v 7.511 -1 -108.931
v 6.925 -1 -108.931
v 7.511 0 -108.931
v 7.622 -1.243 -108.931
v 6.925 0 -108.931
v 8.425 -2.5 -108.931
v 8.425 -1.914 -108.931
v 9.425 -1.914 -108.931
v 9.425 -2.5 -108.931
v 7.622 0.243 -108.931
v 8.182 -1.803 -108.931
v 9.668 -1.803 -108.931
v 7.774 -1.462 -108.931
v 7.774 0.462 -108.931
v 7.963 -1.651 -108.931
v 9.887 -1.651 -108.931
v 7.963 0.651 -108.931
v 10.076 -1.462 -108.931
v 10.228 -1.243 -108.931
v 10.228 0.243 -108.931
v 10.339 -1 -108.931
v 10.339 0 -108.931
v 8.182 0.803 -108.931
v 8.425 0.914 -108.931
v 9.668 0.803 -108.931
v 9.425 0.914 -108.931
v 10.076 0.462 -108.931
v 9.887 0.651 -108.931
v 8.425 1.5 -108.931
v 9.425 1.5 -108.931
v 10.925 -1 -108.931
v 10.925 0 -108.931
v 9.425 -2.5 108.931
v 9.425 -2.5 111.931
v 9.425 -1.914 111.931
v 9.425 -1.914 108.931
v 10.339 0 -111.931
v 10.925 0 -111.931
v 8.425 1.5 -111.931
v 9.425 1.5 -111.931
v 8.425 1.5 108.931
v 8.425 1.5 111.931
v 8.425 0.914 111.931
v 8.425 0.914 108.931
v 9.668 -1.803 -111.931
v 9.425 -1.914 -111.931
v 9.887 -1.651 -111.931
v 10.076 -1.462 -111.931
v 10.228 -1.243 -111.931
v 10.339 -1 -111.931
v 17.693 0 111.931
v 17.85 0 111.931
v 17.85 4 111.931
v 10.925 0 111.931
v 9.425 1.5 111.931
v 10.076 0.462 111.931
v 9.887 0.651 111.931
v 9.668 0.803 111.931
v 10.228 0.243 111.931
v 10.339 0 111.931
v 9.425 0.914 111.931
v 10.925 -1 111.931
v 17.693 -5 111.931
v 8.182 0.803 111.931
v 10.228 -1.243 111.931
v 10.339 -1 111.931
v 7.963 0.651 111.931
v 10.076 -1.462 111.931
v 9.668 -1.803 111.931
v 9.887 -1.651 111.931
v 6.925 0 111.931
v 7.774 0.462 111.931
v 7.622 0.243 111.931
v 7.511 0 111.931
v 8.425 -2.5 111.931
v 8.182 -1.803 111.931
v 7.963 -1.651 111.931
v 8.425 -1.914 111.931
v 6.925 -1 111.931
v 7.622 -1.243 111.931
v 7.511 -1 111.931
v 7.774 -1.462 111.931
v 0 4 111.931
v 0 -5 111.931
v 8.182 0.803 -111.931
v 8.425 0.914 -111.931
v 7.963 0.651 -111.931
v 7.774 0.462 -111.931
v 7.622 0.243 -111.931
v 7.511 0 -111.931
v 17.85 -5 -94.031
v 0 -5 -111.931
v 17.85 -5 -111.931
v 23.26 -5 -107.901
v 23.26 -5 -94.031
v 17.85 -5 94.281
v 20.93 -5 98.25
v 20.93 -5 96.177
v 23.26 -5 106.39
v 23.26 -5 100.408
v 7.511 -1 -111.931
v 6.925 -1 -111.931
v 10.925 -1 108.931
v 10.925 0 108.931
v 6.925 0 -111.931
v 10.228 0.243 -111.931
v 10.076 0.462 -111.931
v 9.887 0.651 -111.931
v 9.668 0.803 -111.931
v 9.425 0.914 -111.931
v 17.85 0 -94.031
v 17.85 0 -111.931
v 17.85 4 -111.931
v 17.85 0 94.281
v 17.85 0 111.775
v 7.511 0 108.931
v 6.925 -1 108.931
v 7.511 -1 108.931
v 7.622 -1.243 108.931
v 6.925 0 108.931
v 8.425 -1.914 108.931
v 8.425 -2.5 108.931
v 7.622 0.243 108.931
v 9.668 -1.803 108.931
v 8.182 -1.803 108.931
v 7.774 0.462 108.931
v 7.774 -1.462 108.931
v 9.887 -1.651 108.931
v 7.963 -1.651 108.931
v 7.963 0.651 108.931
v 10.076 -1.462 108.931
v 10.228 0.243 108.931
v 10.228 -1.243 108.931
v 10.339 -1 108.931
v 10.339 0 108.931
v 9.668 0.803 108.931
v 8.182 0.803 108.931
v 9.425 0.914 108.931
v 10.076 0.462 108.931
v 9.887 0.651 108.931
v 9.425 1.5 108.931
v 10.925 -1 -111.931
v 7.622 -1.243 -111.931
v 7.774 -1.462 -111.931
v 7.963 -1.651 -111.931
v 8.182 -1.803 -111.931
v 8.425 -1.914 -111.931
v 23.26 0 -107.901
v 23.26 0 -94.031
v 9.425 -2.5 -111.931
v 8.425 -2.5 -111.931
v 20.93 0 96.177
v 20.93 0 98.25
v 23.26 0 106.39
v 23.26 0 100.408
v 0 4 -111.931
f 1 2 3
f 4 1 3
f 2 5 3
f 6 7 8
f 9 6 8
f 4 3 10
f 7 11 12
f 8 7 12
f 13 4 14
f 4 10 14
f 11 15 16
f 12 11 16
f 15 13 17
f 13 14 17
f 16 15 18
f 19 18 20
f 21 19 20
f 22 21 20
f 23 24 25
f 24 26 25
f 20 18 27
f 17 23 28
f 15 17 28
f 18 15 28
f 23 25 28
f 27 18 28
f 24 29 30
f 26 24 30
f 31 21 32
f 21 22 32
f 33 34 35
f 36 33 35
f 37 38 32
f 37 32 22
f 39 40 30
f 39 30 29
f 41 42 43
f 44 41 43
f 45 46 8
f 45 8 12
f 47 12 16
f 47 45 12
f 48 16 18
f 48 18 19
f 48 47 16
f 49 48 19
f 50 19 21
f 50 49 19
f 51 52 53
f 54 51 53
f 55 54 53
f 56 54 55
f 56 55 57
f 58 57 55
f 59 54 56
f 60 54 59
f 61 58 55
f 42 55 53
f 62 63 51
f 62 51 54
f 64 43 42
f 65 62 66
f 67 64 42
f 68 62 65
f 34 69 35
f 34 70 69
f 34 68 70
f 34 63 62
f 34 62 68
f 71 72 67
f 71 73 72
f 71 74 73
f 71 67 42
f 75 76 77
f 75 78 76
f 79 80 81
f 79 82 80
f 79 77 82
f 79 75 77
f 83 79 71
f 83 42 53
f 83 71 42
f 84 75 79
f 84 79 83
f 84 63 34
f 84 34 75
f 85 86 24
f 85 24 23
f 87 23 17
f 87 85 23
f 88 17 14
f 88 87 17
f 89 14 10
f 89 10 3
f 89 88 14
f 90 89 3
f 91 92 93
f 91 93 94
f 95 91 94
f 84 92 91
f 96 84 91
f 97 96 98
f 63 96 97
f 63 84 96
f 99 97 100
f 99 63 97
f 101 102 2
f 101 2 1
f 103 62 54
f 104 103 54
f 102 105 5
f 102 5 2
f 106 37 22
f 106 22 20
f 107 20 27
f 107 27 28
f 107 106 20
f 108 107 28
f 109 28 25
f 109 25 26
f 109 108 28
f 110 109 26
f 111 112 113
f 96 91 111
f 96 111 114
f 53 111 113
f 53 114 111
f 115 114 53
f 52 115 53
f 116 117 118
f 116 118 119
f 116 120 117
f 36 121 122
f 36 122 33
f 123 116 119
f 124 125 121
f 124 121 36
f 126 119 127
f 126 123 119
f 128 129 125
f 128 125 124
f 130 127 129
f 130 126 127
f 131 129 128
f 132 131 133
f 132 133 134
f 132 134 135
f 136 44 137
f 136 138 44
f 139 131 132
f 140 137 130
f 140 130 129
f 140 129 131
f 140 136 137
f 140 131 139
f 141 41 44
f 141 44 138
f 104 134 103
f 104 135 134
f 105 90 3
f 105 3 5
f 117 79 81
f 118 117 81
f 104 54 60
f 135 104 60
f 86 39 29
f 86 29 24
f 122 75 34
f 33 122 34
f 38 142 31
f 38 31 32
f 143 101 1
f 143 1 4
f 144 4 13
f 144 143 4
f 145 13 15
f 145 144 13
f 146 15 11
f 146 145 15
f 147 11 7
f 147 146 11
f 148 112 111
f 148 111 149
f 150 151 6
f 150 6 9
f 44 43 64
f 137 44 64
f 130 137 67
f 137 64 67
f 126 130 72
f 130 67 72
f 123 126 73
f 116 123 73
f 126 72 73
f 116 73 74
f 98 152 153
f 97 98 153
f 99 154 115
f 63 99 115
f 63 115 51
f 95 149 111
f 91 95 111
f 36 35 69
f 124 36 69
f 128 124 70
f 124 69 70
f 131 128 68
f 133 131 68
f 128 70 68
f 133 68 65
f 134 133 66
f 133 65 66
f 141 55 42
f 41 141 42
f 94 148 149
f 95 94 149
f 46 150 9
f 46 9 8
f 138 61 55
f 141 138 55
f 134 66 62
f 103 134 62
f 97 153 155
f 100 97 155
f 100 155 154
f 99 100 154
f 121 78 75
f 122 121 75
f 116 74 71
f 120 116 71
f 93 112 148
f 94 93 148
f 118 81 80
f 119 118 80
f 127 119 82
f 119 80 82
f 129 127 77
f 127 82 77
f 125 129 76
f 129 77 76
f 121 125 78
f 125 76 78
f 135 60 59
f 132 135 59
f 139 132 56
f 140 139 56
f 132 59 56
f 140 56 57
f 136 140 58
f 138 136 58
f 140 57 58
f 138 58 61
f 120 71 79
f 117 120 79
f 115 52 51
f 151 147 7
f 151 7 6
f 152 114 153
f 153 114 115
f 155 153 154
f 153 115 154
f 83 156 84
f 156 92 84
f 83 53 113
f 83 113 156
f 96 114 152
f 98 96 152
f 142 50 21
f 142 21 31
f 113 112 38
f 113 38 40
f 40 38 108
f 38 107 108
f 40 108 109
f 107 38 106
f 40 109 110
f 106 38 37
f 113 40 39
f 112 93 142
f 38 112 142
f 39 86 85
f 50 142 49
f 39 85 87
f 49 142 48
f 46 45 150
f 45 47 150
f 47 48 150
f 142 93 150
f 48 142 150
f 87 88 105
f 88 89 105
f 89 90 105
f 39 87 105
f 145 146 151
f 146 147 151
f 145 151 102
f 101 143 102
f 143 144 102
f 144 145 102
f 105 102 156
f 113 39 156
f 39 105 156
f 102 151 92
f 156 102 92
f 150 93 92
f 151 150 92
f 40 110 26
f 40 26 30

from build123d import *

# Parameters (mm, degrees)
F1_DEPTH = 5
F2_W     = 17.85
F2_H     = 223.862902
F3_DEPTH = 4
F5_DEPTH = 3


with BuildPart() as f1:
    # F0 (on Front) → F1 (new body)
    with BuildSketch(Plane.XZ):
        Polygon((17.692703, 111.931451), (0, 111.931451), (0, -111.931451), (17.85, -111.931451), (23.26, -107.9006), (23.26, -94.031428), (17.85, -94.031428), (17.85, 94.281451), (20.929774, 96.176705), (20.929774, 98.249632), (23.26, 100.407617), (23.26, 106.389501), align=None)
    extrude(amount=F1_DEPTH)

    # F2 (on face) → F3 (join)
    with BuildSketch(Plane(origin=(0, 0, 0), x_dir=(-1, 0, 0), z_dir=(0, 1, 0))):
        with Locations((-8.925, 0)):
            Rectangle(F2_W, F2_H)
    extrude(amount=F3_DEPTH)


with BuildPart() as f5:
    # F4 (on face) → F5 (new body)
    with BuildSketch(Plane.XY.offset(111.931451)):
        with BuildLine():
            Line((6.925, -1), (7.510786, -1))
            ThreePointArc((7.510786, -1), (7.86434, -1.56066), (8.425, -1.914214))
            Line((8.425, -1.914214), (8.425, -2.5))
            Line((8.425, -2.5), (9.425, -2.5))
            Line((9.425, -2.5), (9.425, -1.914214))
            ThreePointArc((9.425, -1.914214), (9.98566, -1.56066), (10.339214, -1))
            Line((10.339214, -1), (10.925, -1))
            Line((10.925, -1), (10.925, 0))
            Line((10.925, 0), (10.339214, 0))
            ThreePointArc((10.339214, 0), (9.98566, 0.56066), (9.425, 0.914214))
            Line((9.425, 0.914214), (9.425, 1.5))
            Line((9.425, 1.5), (8.425, 1.5))
            Line((8.425, 1.5), (8.425, 0.914214))
            ThreePointArc((8.425, 0.914214), (7.86434, 0.56066), (7.510786, 0))
            Line((7.510786, 0), (6.925, 0))
            Line((6.925, 0), (6.925, -1))
        make_face()
    extrude(amount=-F5_DEPTH)


with BuildPart() as f6_1:
    # F6: instance of F5
    add(f5.part.mirror(Plane.XY))


with BuildPart() as f1_1:
    add(f1.part)

    # F7: cut F5
    add(f5.part, mode=Mode.SUBTRACT)

    # F8: cut F6_1
    add(f6_1.part, mode=Mode.SUBTRACT)


solid = f1_1.part
